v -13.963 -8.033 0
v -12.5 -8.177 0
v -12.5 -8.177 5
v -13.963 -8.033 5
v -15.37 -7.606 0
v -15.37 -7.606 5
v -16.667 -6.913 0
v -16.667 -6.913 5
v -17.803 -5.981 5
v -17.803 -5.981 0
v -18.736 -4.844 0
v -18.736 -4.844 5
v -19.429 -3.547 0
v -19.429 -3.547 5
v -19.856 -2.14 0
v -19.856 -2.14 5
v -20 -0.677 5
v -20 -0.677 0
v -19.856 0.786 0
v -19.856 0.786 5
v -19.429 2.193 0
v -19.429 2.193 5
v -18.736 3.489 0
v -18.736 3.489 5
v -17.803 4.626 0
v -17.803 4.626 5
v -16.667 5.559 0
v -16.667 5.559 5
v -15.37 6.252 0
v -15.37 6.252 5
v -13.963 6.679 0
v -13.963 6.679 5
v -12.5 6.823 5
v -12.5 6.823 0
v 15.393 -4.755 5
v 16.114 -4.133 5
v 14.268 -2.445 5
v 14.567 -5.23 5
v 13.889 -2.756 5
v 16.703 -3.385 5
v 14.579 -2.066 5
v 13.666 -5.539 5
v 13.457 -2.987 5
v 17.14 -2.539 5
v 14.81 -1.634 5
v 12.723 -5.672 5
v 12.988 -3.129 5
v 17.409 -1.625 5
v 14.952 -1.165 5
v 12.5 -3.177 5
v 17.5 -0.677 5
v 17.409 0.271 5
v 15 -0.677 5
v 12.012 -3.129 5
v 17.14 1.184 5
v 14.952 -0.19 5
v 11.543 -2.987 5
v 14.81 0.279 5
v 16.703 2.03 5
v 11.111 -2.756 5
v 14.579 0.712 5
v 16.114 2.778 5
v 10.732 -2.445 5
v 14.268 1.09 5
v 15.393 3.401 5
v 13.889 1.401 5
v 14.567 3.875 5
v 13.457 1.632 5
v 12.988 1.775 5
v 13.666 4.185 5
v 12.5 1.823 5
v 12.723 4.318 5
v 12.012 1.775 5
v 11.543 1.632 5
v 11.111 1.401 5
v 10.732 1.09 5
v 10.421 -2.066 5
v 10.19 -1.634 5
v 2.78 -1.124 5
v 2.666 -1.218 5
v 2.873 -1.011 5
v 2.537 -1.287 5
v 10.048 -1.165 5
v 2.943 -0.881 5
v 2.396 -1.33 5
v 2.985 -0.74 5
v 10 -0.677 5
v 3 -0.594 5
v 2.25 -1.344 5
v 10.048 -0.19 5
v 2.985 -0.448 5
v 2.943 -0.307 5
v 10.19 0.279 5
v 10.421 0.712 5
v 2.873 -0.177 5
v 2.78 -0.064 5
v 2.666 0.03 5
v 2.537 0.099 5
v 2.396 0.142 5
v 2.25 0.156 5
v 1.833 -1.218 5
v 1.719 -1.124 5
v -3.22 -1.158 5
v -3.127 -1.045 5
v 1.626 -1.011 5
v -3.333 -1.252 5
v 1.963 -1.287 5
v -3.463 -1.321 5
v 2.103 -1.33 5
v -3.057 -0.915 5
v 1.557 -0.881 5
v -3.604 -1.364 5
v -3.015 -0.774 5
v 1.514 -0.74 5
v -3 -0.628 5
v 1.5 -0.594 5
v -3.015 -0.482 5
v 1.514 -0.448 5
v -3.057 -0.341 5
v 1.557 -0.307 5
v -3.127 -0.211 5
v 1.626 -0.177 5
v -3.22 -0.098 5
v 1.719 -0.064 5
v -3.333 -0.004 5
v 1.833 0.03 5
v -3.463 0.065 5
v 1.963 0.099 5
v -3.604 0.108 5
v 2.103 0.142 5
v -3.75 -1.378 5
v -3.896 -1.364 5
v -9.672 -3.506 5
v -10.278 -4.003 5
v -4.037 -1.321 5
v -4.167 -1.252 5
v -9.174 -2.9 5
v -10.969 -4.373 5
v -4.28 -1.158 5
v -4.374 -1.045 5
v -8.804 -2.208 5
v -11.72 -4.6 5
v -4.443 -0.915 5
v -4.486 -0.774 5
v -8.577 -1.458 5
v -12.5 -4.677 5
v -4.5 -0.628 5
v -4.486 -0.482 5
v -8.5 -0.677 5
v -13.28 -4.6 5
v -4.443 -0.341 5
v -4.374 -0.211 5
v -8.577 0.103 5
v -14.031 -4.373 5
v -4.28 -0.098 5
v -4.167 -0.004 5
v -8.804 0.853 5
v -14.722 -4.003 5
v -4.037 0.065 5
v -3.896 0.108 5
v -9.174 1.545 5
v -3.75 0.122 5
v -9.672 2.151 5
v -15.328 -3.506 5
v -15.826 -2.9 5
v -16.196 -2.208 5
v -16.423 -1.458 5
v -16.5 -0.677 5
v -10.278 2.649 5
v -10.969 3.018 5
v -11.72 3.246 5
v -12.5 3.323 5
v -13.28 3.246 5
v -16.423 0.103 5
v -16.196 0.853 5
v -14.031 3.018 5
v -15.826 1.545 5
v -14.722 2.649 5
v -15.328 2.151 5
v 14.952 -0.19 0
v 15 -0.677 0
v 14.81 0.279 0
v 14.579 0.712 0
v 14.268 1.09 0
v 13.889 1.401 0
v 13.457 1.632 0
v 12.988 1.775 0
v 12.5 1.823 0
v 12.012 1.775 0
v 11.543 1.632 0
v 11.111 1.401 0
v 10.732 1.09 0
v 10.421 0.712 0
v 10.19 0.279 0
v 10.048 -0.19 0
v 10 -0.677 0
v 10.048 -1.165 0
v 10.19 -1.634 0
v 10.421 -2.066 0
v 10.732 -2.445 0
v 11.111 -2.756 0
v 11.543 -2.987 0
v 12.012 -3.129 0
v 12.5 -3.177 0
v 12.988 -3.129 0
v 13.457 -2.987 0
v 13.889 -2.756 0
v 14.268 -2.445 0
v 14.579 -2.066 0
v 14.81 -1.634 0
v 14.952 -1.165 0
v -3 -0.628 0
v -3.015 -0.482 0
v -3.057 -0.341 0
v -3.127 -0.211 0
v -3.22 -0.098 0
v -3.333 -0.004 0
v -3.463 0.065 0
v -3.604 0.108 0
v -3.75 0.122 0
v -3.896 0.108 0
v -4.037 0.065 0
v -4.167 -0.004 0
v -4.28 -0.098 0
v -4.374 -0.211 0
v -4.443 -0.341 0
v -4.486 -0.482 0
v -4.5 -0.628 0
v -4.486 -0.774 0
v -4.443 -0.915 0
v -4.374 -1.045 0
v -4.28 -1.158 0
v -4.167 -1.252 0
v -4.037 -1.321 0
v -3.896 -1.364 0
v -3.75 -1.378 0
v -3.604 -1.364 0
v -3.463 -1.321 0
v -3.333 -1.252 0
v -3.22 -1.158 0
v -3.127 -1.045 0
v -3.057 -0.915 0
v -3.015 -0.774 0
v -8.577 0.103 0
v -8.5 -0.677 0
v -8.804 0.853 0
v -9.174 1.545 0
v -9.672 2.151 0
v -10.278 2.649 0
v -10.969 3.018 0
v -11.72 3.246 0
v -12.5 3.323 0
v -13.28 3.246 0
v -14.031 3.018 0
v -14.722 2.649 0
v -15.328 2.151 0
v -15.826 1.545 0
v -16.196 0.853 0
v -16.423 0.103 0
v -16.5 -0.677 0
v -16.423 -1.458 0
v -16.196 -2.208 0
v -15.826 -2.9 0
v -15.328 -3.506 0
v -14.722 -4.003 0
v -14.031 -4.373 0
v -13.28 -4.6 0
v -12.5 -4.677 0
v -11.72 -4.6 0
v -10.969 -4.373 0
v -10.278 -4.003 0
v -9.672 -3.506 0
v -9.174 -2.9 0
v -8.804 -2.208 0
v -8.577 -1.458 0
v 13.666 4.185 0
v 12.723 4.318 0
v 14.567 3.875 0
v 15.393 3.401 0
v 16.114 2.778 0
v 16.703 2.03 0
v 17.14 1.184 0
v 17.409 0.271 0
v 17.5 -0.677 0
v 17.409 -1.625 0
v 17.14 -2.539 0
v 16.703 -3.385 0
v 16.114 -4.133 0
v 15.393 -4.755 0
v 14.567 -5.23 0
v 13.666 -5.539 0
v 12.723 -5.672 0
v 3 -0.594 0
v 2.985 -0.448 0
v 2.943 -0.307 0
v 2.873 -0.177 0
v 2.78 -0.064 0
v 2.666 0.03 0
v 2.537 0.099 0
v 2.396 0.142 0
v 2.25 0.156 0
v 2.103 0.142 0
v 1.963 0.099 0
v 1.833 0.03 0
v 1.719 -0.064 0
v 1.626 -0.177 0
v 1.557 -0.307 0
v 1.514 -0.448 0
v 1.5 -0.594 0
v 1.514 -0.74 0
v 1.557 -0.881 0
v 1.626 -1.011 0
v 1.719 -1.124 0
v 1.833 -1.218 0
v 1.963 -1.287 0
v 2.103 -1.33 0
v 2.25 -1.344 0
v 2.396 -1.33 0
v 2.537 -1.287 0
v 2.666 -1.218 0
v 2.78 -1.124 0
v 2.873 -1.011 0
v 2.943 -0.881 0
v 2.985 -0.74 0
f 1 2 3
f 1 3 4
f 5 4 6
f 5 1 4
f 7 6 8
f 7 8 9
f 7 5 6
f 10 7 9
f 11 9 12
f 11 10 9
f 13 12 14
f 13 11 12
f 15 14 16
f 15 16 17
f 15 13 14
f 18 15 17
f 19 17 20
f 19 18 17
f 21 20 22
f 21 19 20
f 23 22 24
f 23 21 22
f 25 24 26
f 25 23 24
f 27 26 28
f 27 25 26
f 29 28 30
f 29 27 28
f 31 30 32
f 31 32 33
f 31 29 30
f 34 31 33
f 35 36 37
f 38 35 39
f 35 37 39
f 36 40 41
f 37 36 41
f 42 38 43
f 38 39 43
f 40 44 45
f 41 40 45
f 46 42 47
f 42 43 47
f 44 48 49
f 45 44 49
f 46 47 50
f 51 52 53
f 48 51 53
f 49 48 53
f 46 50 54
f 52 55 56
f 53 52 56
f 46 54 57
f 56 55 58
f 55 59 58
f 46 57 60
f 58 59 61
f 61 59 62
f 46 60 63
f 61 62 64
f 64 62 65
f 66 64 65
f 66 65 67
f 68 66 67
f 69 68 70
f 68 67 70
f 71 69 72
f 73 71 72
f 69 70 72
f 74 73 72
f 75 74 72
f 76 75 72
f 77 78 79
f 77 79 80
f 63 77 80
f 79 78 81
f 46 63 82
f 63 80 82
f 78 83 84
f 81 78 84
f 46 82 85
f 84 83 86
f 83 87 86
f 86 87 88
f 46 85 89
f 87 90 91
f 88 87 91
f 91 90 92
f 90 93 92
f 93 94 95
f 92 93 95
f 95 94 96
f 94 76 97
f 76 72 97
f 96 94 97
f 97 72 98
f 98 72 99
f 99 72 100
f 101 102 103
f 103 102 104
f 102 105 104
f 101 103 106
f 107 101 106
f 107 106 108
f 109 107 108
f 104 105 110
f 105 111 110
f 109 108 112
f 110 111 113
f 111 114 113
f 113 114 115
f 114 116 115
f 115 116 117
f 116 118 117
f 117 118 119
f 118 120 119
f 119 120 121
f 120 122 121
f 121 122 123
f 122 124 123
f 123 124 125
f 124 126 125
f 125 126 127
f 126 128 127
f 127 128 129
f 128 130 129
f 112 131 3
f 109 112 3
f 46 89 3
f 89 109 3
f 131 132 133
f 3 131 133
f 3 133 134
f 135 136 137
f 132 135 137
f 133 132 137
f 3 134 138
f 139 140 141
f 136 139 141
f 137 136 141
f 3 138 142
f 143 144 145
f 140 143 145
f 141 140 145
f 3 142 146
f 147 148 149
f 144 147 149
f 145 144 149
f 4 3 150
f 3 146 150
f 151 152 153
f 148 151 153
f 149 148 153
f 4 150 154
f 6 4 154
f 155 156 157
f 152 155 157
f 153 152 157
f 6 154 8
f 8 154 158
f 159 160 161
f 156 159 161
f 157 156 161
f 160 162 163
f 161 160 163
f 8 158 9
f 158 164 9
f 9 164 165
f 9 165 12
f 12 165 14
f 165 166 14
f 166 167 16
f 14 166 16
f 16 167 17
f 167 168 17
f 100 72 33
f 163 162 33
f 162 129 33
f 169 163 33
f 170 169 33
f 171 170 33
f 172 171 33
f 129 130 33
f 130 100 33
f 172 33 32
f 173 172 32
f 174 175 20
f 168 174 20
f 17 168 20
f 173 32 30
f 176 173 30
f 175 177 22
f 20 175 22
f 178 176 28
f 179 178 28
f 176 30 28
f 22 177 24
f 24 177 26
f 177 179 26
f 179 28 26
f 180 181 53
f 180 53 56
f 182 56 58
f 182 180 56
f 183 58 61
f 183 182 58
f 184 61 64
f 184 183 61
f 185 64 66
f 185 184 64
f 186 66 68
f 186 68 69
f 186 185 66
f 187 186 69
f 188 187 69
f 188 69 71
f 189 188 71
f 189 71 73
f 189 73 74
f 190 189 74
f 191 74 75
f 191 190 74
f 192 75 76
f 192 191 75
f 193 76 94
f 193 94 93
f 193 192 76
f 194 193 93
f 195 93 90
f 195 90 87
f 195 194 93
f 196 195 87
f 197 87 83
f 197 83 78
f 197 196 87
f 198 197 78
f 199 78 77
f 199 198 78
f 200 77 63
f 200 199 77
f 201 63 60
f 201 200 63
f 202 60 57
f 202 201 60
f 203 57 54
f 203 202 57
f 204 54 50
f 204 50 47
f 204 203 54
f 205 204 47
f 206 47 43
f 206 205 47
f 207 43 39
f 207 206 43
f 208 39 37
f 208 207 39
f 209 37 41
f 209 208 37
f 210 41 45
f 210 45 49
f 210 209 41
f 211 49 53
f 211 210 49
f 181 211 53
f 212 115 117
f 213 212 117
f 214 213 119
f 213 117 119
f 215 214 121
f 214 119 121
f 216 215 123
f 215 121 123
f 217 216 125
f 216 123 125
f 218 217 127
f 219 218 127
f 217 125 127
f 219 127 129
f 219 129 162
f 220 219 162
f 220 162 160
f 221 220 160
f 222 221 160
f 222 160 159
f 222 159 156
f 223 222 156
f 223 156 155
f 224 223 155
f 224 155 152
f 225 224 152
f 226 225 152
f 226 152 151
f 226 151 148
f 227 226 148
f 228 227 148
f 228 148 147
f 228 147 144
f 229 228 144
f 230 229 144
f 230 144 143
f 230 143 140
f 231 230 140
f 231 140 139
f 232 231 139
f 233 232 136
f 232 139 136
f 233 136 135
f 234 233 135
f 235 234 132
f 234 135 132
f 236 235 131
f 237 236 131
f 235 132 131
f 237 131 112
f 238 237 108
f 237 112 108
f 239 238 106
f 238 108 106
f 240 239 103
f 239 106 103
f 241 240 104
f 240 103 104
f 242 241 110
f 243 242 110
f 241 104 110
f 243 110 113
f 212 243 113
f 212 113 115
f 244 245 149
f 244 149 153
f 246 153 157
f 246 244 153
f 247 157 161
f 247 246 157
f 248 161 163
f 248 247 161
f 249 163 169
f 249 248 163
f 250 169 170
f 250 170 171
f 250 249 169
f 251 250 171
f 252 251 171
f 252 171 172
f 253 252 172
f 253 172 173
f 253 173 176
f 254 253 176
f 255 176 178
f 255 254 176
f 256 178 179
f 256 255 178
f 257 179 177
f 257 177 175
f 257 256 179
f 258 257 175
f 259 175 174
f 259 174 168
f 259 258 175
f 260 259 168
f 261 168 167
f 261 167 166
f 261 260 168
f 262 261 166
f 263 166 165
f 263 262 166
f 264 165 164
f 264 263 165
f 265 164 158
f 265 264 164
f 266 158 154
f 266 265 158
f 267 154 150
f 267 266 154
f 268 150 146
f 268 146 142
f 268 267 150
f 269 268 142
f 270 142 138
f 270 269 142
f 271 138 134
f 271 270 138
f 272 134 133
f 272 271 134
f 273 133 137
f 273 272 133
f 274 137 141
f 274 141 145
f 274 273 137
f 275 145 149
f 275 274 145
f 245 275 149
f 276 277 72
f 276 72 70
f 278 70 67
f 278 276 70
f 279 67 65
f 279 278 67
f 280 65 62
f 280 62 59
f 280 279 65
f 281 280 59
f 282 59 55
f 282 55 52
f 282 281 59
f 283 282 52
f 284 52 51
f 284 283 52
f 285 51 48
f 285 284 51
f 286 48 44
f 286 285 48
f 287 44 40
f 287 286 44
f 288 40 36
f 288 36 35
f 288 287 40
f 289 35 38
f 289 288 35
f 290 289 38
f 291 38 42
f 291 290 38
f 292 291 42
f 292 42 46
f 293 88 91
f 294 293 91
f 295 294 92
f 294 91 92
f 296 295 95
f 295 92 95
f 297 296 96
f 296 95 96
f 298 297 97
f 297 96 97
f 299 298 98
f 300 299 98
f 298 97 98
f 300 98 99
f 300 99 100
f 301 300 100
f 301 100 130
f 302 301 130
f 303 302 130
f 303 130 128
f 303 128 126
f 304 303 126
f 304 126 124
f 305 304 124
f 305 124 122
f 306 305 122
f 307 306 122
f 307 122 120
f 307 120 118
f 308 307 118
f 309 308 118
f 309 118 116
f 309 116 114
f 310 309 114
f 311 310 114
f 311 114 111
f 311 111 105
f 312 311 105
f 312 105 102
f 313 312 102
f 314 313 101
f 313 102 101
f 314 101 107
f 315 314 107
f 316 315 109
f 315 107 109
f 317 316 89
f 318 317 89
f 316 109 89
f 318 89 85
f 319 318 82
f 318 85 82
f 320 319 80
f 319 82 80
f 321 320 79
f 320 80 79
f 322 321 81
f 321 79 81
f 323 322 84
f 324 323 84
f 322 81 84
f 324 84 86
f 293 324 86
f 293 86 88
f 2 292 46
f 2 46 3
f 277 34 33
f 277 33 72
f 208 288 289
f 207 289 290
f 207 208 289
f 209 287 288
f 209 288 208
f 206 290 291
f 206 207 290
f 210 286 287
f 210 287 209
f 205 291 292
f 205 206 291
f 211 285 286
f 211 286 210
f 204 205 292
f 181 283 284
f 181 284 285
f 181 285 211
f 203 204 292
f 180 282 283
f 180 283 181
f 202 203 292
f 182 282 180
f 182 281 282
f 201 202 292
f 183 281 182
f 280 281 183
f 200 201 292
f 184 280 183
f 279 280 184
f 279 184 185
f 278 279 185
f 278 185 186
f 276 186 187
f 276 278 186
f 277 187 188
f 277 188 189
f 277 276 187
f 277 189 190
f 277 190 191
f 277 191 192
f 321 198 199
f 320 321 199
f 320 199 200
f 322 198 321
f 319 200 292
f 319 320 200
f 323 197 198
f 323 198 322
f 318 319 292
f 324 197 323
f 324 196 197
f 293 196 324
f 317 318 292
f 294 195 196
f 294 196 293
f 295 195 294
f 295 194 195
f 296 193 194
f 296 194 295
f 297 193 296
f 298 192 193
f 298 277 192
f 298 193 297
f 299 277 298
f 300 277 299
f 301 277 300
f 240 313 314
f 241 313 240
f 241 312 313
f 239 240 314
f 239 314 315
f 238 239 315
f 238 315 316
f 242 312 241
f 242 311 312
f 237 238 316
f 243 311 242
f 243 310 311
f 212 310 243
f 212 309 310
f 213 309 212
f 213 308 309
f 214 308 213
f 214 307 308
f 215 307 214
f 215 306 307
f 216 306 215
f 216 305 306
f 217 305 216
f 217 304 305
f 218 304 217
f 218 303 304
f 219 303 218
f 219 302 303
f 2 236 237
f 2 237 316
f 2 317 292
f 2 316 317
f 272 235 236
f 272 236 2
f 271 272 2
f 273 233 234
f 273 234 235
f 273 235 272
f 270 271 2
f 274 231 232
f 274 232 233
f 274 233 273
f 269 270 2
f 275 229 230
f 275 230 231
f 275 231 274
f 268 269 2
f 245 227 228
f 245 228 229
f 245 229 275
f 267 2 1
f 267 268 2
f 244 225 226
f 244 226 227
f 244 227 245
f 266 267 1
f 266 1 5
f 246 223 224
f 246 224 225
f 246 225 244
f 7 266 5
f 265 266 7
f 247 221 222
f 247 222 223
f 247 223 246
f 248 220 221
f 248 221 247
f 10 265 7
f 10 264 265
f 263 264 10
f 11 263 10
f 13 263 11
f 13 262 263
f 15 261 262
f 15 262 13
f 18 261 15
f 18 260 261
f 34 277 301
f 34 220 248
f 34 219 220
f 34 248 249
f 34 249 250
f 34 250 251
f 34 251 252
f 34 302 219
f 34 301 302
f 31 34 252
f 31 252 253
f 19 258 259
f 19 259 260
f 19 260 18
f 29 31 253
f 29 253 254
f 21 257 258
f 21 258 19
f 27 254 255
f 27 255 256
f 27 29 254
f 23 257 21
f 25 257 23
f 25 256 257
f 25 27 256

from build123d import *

# Parameters (mm, degrees)
SKETCH1_R           = 4
SKETCH1_R_2         = 2.5
BOSS_EXTRUDE1_DEPTH = 5
SKETCH2_R           = 0.75
CUT_EXTRUDE1_DEPTH  = 10


with BuildPart() as part:
    # Sketch1 → Boss-Extrude1 (new body)
    with BuildSketch(Plane.XY):
        with BuildLine():
            Line((-12.5, 6.822695454), (12.723447831, 4.317700065))
            ThreePointArc((12.723447831, 4.317700065), (17.5, -0.677304546), (12.723447831, -5.672309157))
            Line((12.723447831, -5.672309157), (-12.5, -8.177304546))
            ThreePointArc((-12.5, -8.177304546), (-20, -0.677304546), (-12.5, 6.822695454))
        make_face()
        with Locations((-12.5, -0.677304546)):
            Circle(SKETCH1_R, mode=Mode.SUBTRACT)
        with Locations((12.5, -0.677304546)):
            Circle(SKETCH1_R_2, mode=Mode.SUBTRACT)
    extrude(amount=BOSS_EXTRUDE1_DEPTH)

    # Sketch2 → Cut-Extrude1 (cut)
    with BuildSketch(Plane.XY.offset(5)):
        with Locations((-3.750139294, -0.627932239)):
            Circle(SKETCH2_R)
        with Locations((2.24976519, -0.594076942)):
            Circle(SKETCH2_R)
    extrude(amount=-CUT_EXTRUDE1_DEPTH, mode=Mode.SUBTRACT)


solid = part.part
